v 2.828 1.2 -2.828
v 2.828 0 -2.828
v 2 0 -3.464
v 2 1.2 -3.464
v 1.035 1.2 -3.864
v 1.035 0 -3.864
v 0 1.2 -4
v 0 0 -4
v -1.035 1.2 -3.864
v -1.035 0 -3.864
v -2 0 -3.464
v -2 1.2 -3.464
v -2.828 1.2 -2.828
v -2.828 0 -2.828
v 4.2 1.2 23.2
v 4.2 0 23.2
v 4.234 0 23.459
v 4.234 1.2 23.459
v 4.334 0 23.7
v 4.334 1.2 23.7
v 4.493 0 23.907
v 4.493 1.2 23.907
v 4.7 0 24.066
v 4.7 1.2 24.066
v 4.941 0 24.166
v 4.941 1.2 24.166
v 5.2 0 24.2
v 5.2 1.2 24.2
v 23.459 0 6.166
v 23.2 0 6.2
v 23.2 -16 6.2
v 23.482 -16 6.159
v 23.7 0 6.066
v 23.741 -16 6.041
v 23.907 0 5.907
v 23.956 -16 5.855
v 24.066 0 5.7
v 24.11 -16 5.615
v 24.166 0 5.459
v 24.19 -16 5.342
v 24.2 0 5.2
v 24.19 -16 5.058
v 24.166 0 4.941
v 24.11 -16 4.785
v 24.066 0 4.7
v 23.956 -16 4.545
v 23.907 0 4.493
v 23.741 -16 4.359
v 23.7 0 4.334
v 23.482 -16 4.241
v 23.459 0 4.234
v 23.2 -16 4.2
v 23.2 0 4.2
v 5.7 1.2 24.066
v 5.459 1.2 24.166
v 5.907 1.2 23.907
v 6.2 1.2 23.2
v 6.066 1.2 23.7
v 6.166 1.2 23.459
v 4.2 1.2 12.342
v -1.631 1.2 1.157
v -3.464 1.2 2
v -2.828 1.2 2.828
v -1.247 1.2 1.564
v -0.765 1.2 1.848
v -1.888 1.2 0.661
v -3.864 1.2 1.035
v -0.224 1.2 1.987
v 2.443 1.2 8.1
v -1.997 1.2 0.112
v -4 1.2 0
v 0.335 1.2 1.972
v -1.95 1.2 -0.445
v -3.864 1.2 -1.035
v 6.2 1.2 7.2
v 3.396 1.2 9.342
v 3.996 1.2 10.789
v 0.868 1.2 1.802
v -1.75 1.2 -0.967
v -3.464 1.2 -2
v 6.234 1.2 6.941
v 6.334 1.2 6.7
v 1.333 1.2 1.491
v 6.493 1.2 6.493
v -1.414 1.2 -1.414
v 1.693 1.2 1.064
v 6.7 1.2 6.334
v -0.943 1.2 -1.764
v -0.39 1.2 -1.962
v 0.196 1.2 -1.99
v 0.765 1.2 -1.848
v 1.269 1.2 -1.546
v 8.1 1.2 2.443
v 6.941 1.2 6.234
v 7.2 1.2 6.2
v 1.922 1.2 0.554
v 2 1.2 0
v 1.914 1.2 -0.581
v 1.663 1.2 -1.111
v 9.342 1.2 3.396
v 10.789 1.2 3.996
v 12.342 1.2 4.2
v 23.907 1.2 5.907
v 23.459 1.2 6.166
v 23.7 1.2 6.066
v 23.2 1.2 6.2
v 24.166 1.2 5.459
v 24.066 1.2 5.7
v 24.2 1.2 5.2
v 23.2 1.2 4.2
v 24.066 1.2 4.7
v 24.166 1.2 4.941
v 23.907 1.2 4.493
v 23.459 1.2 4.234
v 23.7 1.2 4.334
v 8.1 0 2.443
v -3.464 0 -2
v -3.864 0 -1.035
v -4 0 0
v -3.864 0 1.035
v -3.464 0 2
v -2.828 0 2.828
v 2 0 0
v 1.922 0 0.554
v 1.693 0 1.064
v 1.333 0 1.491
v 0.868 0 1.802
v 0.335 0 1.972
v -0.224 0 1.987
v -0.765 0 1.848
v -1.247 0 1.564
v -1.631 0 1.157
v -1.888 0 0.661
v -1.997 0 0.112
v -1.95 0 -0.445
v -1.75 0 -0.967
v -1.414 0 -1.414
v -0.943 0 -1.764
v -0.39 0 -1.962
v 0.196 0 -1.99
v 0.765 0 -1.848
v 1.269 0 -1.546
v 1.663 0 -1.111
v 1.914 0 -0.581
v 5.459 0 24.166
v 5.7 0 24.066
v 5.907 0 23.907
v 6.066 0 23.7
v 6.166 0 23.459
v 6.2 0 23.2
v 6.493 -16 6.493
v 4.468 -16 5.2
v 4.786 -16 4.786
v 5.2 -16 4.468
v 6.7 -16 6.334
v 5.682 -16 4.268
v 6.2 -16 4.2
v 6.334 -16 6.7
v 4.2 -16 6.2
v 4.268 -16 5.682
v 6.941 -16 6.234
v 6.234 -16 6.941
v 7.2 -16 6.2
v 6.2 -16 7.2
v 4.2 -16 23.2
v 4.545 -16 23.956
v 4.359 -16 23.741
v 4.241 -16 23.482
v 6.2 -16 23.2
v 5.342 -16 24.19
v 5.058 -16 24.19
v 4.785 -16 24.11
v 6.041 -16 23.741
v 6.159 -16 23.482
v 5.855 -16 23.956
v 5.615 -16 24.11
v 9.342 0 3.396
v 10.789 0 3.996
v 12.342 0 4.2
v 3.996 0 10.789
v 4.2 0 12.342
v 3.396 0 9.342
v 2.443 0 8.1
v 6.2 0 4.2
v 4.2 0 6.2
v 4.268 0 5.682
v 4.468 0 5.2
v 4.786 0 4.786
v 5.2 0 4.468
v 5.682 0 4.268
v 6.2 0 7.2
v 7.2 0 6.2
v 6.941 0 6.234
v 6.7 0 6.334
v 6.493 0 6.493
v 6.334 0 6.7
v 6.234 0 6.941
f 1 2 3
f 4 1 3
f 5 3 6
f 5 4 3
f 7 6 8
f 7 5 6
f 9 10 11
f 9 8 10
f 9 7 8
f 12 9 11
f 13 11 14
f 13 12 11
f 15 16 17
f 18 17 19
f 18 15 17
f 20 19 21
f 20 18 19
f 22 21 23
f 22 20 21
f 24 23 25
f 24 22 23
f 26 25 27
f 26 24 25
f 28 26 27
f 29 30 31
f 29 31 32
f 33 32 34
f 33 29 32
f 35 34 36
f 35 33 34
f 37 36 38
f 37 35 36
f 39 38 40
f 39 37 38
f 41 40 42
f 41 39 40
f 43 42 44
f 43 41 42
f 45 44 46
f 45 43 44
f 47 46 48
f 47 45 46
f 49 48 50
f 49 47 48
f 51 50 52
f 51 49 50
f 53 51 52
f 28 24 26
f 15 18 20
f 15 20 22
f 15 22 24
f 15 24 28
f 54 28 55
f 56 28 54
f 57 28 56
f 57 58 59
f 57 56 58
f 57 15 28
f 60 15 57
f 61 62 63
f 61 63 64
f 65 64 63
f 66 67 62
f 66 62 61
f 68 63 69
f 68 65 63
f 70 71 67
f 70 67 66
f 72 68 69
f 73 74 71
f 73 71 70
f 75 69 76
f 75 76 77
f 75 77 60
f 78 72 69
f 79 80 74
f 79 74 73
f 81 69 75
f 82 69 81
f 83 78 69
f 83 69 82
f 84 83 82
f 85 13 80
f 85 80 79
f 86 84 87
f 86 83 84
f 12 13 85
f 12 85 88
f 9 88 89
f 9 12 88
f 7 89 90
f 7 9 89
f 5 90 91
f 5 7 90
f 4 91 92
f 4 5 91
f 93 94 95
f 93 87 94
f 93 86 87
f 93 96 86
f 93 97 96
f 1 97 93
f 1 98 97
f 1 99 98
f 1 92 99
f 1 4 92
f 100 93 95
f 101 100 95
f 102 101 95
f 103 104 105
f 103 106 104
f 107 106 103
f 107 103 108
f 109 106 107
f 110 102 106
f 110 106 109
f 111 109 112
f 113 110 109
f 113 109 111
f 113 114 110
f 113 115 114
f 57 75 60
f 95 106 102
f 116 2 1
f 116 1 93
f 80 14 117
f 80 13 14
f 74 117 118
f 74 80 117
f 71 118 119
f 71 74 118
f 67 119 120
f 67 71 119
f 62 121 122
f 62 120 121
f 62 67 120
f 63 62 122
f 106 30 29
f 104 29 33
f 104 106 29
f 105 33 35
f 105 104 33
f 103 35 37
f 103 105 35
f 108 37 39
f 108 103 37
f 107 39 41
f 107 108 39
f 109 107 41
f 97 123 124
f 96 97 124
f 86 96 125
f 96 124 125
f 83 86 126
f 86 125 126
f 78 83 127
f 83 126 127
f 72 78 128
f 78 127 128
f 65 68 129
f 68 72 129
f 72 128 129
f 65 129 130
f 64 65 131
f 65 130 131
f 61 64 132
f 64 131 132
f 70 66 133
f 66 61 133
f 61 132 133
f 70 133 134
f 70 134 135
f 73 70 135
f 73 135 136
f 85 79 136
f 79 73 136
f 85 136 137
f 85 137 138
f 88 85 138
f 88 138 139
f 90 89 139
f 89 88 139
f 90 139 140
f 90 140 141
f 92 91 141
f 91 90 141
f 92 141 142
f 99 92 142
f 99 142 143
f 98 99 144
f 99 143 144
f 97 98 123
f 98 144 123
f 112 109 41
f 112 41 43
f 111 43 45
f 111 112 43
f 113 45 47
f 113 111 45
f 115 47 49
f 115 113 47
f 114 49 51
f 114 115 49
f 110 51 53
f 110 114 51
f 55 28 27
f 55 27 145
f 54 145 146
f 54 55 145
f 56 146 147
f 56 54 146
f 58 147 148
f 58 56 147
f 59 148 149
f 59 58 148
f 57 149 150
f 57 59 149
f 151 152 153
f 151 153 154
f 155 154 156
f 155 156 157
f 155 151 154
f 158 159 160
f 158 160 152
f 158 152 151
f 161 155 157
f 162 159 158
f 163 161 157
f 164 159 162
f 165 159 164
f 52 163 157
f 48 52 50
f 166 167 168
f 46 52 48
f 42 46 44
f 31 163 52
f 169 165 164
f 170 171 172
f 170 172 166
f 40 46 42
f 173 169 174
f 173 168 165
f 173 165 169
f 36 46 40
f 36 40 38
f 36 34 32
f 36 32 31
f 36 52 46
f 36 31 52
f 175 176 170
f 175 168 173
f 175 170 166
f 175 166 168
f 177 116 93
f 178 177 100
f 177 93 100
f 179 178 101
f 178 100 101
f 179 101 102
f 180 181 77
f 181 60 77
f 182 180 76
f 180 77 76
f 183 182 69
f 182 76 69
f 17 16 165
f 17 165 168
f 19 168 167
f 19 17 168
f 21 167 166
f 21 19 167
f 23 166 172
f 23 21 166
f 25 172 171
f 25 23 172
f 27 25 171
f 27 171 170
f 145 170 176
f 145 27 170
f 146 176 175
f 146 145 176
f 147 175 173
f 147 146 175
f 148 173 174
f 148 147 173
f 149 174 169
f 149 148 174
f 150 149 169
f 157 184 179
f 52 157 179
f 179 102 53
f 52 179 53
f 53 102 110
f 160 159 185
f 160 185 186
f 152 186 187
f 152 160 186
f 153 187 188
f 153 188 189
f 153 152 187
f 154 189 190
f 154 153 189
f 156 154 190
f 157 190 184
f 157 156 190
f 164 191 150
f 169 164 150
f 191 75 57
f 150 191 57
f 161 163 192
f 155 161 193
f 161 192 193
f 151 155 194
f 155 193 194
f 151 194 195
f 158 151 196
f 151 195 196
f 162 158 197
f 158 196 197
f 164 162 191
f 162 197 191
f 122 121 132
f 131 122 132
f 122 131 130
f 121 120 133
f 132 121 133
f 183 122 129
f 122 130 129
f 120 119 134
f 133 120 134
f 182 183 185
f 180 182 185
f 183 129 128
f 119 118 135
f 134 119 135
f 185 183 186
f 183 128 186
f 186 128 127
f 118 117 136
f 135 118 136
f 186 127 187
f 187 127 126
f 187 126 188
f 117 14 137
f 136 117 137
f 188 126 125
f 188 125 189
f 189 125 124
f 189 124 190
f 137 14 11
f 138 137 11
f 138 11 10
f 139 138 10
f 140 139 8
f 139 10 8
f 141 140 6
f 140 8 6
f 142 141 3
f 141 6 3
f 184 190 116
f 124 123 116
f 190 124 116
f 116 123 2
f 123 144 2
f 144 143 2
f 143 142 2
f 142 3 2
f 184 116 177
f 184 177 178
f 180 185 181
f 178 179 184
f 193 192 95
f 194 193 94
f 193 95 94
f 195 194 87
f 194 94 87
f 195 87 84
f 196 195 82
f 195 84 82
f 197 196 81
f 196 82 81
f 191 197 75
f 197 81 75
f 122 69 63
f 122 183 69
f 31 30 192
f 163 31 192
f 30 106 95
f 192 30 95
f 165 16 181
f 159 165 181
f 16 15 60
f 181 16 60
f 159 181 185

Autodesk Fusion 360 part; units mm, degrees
sketch "Sketch1" plane through (0, 0, 0) normal (0, 1, 0) x (1, 0, 0)
  circle A0 centre (0, 0) radius 2
  line L0 (0, 0) -> (4.2, -4.2) construction
  line L1 (4.2, -4.2) -> (24.2, -4.2)
  line L2 (24.2, -4.2) -> (24.2, -6.2)
  line L3 (24.2, -6.2) -> (4.2, -6.2)
  line L4 (4.2, -6.2) -> (4.2, -4.2)
  line L5 (4.2, -4.2) -> (6.2, -4.2)
  line L6 (6.2, -4.2) -> (6.2, -24.2)
  line L7 (6.2, -24.2) -> (4.2, -24.2)
  line L8 (4.2, -24.2) -> (4.2, -4.2)
  line L9 (4.2, -9.8569) -> (-5.6569, 0)
  line L10 (-5.6569, 0) -> (0, 5.6569)
  line L11 (0, 5.6569) -> (9.8569, -4.2)
  line L12 (0, 0) -> (-2.8284, 2.8284)
  dimension "d1" = 4
  dimension "d2" = 4.2
  dimension "d3" = 4.2
  dimension "d4" = 2
  dimension "d5" = 20
  dimension "d6" = 135
  dimension "d7" = 4
  dimension "d8" = 8
extrude "Extrude1" add sketch "Sketch1" along normal blind 1.2
fillet "Fillet1" radius 1 5 edges at (6.2, 0.6, 6.2) (6.2, 0.6, 24.2) (4.2, 0.6, 24.2) (24.2, 0.6, 6.2) (24.2, 0.6, 4.2)
fillet "Fillet2" radius 4 2 edges at (-5.6569, 0.6, 0) (0, 0.6, -5.6569)
fillet "Fillet3" radius 6 2 edges at (4.2, 0.6, 9.8569) (9.8569, 0.6, 4.2)
sketch "Sketch2" plane through (0, 0, 0) normal (0, -1, 0) x (1, 0, 0)
  arc A0 (-2.8284, 2.8284) -> (2.8284, -2.8284) centre (0, 0) ccw
  line L0 (2.8284, -2.8284) -> (8.0995, 2.4426)
  arc A1 (12.3421, 4.2) -> (8.0995, 2.4426) centre (12.3421, -1.8) ccw
  line L1 (12.3421, 4.2) -> (23.2, 4.2)
  arc A2 (23.2, 4.2) -> (23.2, 6.2) centre (23.2, 5.2) ccw
  line L2 (23.2, 6.2) -> (7.2, 6.2)
  arc A3 (6.2, 7.2) -> (7.2, 6.2) centre (7.2, 7.2) ccw
  line L3 (6.2, 7.2) -> (6.2, 23.2)
  arc A4 (6.2, 23.2) -> (4.2, 23.2) centre (5.2, 23.2) ccw
  line L4 (4.2, 23.2) -> (4.2, 12.3421)
  arc A5 (2.4426, 8.0995) -> (4.2, 12.3421) centre (-1.8, 12.3421) ccw
  line L5 (2.4426, 8.0995) -> (-2.8284, 2.8284)
  circle A6 centre (0, 0) radius 2
  line L6 (4.2, 23.2) -> (4.2, 4.2)
  line L7 (4.2, 4.2) -> (23.2, 4.2)
extrude "Extrude2" add sketch "Sketch2" along normal blind 16 contours L1 A2 L2 A3 L3 A4 L4 L6 L7
fillet "Fillet4" radius 2 1 edges at (4.2, -8, 4.2)
equation "d6 = 180 deg - 45 deg"
